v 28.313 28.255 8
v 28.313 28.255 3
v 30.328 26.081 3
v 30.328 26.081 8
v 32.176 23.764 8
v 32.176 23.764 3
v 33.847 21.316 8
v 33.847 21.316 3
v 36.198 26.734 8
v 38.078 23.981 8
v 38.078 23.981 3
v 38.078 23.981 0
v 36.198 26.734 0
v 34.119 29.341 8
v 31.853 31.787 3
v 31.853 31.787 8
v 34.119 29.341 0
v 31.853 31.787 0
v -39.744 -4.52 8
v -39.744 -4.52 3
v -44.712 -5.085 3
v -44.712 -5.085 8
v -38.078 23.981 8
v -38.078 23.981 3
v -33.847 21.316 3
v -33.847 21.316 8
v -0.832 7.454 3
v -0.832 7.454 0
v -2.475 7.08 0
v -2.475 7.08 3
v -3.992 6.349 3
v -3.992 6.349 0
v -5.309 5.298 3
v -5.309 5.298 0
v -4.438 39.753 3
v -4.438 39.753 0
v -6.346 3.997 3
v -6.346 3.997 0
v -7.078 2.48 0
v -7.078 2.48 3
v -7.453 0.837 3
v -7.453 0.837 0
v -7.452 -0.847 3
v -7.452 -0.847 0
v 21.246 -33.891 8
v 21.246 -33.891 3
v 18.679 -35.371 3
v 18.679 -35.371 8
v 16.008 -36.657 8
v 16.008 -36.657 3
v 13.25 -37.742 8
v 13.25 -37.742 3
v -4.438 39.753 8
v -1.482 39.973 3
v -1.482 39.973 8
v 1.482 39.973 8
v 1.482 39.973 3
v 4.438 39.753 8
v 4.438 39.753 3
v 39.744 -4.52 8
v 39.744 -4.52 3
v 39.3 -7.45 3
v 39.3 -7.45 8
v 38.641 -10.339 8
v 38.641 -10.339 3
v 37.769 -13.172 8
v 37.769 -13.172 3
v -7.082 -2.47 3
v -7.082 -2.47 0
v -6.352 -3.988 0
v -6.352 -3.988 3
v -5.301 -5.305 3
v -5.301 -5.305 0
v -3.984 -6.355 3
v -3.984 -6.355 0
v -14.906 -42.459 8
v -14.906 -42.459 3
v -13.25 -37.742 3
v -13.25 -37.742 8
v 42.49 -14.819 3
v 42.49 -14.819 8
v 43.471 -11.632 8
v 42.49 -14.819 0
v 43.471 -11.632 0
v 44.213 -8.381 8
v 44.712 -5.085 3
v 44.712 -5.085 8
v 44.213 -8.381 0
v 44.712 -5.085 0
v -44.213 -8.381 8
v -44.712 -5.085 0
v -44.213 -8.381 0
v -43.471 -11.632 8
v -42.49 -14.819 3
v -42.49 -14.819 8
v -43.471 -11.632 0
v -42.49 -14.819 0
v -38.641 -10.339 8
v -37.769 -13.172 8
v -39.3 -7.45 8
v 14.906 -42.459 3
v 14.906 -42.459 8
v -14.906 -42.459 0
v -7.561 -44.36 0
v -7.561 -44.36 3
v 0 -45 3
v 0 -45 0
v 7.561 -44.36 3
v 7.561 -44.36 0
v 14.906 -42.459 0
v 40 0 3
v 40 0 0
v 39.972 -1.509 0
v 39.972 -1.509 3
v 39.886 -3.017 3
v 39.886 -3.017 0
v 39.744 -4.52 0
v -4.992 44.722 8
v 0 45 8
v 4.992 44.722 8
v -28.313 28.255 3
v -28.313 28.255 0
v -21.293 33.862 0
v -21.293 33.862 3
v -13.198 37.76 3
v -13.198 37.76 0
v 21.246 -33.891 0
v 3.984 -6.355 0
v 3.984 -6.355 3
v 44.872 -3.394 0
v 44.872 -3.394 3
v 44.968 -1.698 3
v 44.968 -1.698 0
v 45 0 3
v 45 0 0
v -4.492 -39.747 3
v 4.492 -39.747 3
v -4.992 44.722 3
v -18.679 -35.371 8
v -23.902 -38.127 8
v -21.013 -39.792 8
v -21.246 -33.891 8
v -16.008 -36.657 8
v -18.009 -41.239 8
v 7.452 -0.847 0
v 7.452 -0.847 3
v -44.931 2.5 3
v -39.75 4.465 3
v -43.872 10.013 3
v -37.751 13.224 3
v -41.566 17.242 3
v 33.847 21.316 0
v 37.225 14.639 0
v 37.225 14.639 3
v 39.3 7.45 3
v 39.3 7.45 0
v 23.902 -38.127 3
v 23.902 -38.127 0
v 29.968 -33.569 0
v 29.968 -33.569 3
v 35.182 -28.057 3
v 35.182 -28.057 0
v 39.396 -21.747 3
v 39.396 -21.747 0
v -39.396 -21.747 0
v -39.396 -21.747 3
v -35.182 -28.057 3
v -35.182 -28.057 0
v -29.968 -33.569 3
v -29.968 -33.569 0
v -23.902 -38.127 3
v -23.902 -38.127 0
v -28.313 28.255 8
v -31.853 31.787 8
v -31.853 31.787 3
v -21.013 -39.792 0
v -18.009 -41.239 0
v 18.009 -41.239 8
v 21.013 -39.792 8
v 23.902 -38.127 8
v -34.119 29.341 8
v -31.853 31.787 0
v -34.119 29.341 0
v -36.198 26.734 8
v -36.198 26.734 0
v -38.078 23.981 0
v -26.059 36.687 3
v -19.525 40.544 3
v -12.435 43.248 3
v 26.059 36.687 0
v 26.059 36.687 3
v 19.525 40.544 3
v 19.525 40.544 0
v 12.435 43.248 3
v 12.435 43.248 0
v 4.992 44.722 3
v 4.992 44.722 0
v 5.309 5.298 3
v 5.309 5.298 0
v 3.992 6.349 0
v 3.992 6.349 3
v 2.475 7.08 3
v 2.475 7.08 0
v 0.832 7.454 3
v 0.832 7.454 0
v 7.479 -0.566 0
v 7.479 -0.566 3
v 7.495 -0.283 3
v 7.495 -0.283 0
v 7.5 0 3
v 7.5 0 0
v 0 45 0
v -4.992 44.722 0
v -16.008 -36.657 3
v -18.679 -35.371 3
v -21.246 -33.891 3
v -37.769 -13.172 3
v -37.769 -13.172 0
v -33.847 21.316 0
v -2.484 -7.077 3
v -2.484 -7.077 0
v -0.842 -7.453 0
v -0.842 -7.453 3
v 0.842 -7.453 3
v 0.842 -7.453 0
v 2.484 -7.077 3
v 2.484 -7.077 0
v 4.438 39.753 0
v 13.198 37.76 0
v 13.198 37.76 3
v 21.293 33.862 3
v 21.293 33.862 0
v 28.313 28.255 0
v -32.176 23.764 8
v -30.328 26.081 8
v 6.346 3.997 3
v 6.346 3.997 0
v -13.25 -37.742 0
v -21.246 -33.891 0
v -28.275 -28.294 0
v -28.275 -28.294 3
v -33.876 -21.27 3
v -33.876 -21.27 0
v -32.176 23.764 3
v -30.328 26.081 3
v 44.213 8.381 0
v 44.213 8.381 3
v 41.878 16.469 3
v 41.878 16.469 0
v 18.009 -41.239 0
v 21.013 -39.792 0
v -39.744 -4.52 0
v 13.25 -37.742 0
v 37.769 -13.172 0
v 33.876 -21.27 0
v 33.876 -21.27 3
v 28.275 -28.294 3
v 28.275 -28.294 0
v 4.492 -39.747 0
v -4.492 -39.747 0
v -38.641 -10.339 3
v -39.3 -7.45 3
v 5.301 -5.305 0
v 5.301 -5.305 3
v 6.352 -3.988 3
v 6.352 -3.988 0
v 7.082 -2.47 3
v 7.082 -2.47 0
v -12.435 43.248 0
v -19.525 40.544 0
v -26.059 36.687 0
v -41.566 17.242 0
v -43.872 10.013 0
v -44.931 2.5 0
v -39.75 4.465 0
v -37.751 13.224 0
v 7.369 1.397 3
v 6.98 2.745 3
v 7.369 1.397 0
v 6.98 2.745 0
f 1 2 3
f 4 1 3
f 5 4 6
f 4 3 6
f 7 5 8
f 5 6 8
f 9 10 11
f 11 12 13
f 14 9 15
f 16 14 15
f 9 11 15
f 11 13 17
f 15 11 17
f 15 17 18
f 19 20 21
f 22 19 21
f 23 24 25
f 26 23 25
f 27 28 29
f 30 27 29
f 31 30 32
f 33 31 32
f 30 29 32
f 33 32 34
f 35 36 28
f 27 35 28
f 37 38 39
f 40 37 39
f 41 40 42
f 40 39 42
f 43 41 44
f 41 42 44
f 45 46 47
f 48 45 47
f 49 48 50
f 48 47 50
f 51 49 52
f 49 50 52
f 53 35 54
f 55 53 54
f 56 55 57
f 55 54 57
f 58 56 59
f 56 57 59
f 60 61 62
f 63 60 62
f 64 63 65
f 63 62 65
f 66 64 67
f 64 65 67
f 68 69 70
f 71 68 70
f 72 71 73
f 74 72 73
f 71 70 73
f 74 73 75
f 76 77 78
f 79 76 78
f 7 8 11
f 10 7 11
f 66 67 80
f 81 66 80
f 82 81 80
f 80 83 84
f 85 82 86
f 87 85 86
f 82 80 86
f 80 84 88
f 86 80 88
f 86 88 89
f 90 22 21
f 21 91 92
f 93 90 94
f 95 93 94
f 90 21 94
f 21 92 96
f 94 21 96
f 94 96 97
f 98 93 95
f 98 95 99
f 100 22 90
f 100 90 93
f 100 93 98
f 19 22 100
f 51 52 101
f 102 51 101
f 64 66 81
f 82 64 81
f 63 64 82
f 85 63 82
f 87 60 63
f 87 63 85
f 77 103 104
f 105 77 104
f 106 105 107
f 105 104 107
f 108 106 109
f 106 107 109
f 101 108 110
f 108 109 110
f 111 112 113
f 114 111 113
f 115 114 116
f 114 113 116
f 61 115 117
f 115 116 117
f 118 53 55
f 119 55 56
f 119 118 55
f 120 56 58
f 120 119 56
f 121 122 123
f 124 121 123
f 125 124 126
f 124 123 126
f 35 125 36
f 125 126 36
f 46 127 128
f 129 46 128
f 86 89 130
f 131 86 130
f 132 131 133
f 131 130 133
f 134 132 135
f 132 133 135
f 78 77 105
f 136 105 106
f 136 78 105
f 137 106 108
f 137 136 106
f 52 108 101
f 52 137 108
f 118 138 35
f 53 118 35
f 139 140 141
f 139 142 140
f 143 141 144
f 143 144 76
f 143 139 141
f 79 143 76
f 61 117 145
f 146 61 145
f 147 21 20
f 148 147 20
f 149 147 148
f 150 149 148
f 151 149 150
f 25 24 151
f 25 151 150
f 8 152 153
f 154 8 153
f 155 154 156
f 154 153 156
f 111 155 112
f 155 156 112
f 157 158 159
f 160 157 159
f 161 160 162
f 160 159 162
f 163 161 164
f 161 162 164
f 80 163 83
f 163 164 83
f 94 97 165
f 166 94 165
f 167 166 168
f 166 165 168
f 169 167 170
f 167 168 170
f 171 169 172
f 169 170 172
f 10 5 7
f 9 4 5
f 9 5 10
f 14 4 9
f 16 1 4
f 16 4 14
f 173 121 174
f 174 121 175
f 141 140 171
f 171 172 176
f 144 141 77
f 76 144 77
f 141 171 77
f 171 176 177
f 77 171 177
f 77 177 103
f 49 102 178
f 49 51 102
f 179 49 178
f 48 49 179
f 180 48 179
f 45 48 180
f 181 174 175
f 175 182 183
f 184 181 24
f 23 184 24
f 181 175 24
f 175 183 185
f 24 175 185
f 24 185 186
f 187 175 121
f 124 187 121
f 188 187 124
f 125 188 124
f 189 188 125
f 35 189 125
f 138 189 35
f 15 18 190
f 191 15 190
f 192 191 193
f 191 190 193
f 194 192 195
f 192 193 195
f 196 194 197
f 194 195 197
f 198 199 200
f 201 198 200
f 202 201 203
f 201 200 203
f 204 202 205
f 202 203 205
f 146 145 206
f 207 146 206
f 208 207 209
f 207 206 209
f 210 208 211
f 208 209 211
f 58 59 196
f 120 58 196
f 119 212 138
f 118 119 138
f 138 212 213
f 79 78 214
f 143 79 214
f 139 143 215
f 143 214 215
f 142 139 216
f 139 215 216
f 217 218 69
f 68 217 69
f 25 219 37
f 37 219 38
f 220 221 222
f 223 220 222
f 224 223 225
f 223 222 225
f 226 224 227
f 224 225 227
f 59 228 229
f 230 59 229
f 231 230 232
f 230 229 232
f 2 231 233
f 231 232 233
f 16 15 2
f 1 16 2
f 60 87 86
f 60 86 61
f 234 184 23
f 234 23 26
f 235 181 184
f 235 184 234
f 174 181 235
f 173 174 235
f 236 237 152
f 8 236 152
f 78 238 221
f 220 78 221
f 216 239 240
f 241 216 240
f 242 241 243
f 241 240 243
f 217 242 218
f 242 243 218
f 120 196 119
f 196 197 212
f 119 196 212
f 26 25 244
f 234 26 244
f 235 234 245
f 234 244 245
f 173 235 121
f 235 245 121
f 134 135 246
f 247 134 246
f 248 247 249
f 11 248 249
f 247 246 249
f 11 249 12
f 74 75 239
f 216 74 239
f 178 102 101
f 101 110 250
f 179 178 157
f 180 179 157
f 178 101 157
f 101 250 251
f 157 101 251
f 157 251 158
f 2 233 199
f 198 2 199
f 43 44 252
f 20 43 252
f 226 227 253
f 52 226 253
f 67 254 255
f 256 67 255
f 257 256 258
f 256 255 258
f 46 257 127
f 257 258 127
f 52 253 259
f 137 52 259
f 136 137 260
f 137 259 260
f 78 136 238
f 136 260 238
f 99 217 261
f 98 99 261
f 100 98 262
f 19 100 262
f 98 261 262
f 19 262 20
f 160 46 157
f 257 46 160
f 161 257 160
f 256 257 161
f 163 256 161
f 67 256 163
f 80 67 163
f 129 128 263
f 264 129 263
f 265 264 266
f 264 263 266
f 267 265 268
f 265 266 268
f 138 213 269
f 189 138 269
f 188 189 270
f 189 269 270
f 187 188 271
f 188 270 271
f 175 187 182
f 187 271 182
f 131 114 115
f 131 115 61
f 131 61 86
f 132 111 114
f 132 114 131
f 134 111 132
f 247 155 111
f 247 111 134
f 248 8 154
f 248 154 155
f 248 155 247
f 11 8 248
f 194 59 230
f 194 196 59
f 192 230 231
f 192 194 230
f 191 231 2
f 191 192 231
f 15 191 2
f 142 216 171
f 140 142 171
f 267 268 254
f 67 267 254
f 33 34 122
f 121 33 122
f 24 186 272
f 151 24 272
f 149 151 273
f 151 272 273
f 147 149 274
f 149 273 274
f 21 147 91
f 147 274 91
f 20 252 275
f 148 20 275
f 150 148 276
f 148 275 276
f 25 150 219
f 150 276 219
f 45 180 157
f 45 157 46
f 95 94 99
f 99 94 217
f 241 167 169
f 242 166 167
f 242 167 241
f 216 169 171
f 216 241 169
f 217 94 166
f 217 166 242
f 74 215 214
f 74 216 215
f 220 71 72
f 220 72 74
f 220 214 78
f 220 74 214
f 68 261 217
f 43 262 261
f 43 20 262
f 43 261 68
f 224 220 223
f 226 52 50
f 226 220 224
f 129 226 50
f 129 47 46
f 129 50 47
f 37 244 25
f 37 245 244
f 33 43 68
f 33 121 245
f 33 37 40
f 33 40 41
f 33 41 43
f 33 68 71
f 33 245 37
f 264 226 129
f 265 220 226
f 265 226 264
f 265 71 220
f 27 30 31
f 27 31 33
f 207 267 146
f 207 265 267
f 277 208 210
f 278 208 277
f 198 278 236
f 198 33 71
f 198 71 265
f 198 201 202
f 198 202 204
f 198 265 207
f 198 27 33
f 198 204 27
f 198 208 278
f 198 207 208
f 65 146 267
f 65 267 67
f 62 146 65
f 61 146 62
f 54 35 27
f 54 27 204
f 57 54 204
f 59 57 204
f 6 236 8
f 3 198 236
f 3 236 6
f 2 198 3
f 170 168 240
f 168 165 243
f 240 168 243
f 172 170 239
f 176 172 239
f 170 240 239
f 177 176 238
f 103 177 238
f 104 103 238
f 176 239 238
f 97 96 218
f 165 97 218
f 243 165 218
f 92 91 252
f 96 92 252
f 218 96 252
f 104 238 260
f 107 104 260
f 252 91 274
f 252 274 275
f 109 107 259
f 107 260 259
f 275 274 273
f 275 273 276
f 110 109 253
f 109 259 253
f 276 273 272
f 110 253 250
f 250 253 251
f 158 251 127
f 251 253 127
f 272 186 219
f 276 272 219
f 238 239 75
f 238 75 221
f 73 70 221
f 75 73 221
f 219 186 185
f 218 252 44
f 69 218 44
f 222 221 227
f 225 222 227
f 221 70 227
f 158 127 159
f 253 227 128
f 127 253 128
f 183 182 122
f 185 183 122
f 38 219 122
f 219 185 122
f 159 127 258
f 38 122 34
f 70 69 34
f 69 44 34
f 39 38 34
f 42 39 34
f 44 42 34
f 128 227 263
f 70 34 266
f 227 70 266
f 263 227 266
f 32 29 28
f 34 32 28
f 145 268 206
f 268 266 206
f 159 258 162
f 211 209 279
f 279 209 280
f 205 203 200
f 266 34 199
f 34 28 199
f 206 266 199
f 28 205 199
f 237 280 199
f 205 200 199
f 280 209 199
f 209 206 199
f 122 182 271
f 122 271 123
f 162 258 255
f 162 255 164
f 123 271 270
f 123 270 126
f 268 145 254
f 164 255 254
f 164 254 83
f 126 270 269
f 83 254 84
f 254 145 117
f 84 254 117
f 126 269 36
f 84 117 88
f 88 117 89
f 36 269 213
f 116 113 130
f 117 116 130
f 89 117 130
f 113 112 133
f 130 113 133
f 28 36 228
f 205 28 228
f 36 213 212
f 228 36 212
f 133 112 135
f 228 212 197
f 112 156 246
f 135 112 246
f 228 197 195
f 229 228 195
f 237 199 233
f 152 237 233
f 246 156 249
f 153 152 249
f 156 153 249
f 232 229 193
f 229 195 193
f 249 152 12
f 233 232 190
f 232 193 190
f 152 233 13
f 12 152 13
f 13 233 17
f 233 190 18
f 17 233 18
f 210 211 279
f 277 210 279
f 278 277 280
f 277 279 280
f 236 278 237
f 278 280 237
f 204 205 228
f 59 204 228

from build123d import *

# Parameters (mm, degrees)
F1_DEPTH = 3
F2_DEPTH = 8


with BuildPart() as f1:
    # F0 (on Top) → F1 (new body)
    with BuildSketch(Plane.XY):
        with BuildLine():
            Line((-4.4375804335, 39.7530864198), (-4.9922779877, 44.7222222222))
            ThreePointArc((-4.9922779877, 44.7222222222), (-19.5247682603, 40.5435990556), (-31.8526068859, 31.786969572))
            Line((-31.8526068859, 31.786969572), (-28.313428343, 28.255084064))
            ThreePointArc((-28.313428343, 28.255084064), (-17.3553495647, 36.0387547161), (-4.4375804335, 39.7530864198))
        make_face()
        with BuildLine():
            Line((-28.313428343, 28.255084064), (-31.8526068859, 31.786969572))
            ThreePointArc((-31.8526068859, 31.786969572), (-35.1824167111, 28.0570410836), (-38.0778757126, 23.980729372))
            Line((-38.0778757126, 23.980729372), (-33.8470006334, 21.3162038862))
            ThreePointArc((-33.8470006334, 21.3162038862), (-31.2732592987, 24.9395920743), (-28.313428343, 28.255084064))
        make_face()
        with BuildLine():
            ThreePointArc((-6.3463126188, 3.9967882287), (-5.8637361185, 4.6761735139), (-5.3087678143, 5.297828262))
            Line((-5.3087678143, 5.297828262), (-28.313428343, 28.255084064))
            ThreePointArc((-28.313428343, 28.255084064), (-31.2732592987, 24.9395920743), (-33.8470006334, 21.3162038862))
            Line((-33.8470006334, 21.3162038862), (-6.3463126188, 3.9967882287))
        make_face()
        with BuildLine():
            ThreePointArc((-7.0816760631, -2.4697903022), (-7.3119593414, -1.6689070047), (-7.4519715166, -0.847419917))
            Line((-7.4519715166, -0.847419917), (-39.7438480886, -4.5195728906))
            ThreePointArc((-39.7438480886, -4.5195728906), (-38.9971164873, -8.9008373583), (-37.7689390034, -13.1722149449))
            Line((-37.7689390034, -13.1722149449), (-7.0816760631, -2.4697903022))
        make_face()
        with BuildLine():
            ThreePointArc((-37.7689390034, -13.1722149449), (-38.9971164873, -8.9008373583), (-39.7438480886, -4.5195728906))
            Line((-39.7438480886, -4.5195728906), (-44.7118290996, -5.0845195019))
            ThreePointArc((-44.7118290996, -5.0845195019), (-43.8717560482, -10.013442028), (-42.4900563789, -14.818741813))
            Line((-42.4900563789, -14.818741813), (-37.7689390034, -13.1722149449))
        make_face()
        with BuildLine():
            ThreePointArc((-39.7438480886, -4.5195728906), (-38.9971164873, 8.9008373583), (-33.8470006334, 21.3162038862))
            Line((-33.8470006334, 21.3162038862), (-38.0778757126, 23.980729372))
            ThreePointArc((-38.0778757126, 23.980729372), (-43.8717560482, 10.013442028), (-44.7118290996, -5.0845195019))
            Line((-44.7118290996, -5.0845195019), (-39.7438480886, -4.5195728906))
        make_face()
        with BuildLine():
            ThreePointArc((-21.2463395966, -33.8908992761), (-31.2732592987, -24.9395920743), (-37.7689390034, -13.1722149449))
            Line((-37.7689390034, -13.1722149449), (-42.4900563789, -14.818741813))
            ThreePointArc((-42.4900563789, -14.818741813), (-35.1824167111, -28.0570410836), (-23.9021320462, -38.1272616856))
            Line((-23.9021320462, -38.1272616856), (-21.2463395966, -33.8908992761))
        make_face()
        with BuildLine():
            ThreePointArc((-2.4843929921, -7.0765663609), (-3.2541280434, -6.7572665093), (-3.9836886744, -6.3545436143))
            Line((-3.9836886744, -6.3545436143), (-21.2463395966, -33.8908992761))
            ThreePointArc((-21.2463395966, -33.8908992761), (-17.3553495647, -36.0387547161), (-13.2500959579, -37.7416872583))
            Line((-13.2500959579, -37.7416872583), (-2.4843929921, -7.0765663609))
        make_face()
        with BuildLine():
            ThreePointArc((-23.9021320462, -38.1272616856), (-19.5247682603, -40.5435990556), (-14.9063579526, -42.4593981656))
            Line((-14.9063579526, -42.4593981656), (-13.2500959579, -37.7416872583))
            ThreePointArc((-13.2500959579, -37.7416872583), (-17.3553495647, -36.0387547161), (-21.2463395966, -33.8908992761))
            Line((-21.2463395966, -33.8908992761), (-23.9021320462, -38.1272616856))
        make_face()
        with BuildLine():
            ThreePointArc((-14.9063579526, -42.4593981656), (0, -45), (14.9063579526, -42.4593981656))
            Line((14.9063579526, -42.4593981656), (13.2500959579, -37.7416872583))
            ThreePointArc((13.2500959579, -37.7416872583), (0, -40), (-13.2500959579, -37.7416872583))
            Line((-13.2500959579, -37.7416872583), (-14.9063579526, -42.4593981656))
        make_face()
        with BuildLine():
            ThreePointArc((14.9063579526, -42.4593981656), (19.5247682603, -40.5435990556), (23.9021320462, -38.1272616856))
            Line((23.9021320462, -38.1272616856), (21.2463395966, -33.8908992761))
            ThreePointArc((21.2463395966, -33.8908992761), (17.3553495647, -36.0387547161), (13.2500959579, -37.7416872583))
            Line((13.2500959579, -37.7416872583), (14.9063579526, -42.4593981656))
        make_face()
        with BuildLine():
            ThreePointArc((13.2500959579, -37.7416872583), (17.3553495647, -36.0387547161), (21.2463395966, -33.8908992761))
            Line((21.2463395966, -33.8908992761), (3.9836886744, -6.3545436143))
            ThreePointArc((3.9836886744, -6.3545436143), (3.2541280434, -6.7572665093), (2.4843929921, -7.0765663609))
            Line((2.4843929921, -7.0765663609), (13.2500959579, -37.7416872583))
        make_face()
        with BuildLine():
            ThreePointArc((23.9021320462, -38.1272616856), (35.1824167111, -28.0570410836), (42.4900563789, -14.818741813))
            Line((42.4900563789, -14.818741813), (37.7689390034, -13.1722149449))
            ThreePointArc((37.7689390034, -13.1722149449), (31.2732592987, -24.9395920743), (21.2463395966, -33.8908992761))
            Line((21.2463395966, -33.8908992761), (23.9021320462, -38.1272616856))
        make_face()
        with BuildLine():
            ThreePointArc((42.4900563789, -14.818741813), (43.8717560482, -10.013442028), (44.7118290996, -5.0845195019))
            Line((44.7118290996, -5.0845195019), (39.7438480886, -4.5195728906))
            ThreePointArc((39.7438480886, -4.5195728906), (38.9971164873, -8.9008373583), (37.7689390034, -13.1722149449))
            Line((37.7689390034, -13.1722149449), (42.4900563789, -14.818741813))
        make_face()
        with BuildLine():
            ThreePointArc((37.7689390034, -13.1722149449), (38.9971164873, -8.9008373583), (39.7438480886, -4.5195728906))
            Line((39.7438480886, -4.5195728906), (7.4519715166, -0.847419917))
            ThreePointArc((7.4519715166, -0.847419917), (7.3119593414, -1.6689070047), (7.0816760631, -2.4697903022))
            Line((7.0816760631, -2.4697903022), (37.7689390034, -13.1722149449))
        make_face()
        with BuildLine():
            Line((-5.3087678143, 5.297828262), (0, 0))
            Line((0, 0), (-0.8320463313, 7.4537037037))
            ThreePointArc((-0.8320463313, 7.4537037037), (-3.2541280434, 6.7572665093), (-5.3087678143, 5.297828262))
        make_face()
        with BuildLine():
            Line((-6.3463126188, 3.9967882287), (0, 0))
            Line((0, 0), (-5.3087678143, 5.297828262))
            ThreePointArc((-5.3087678143, 5.297828262), (-5.8637361185, 4.6761735139), (-6.3463126188, 3.9967882287))
        make_face()
        with BuildLine():
            Line((-7.4519715166, -0.847419917), (0, 0))
            Line((0, 0), (-6.3463126188, 3.9967882287))
            ThreePointArc((-6.3463126188, 3.9967882287), (-7.3119593414, 1.6689070047), (-7.4519715166, -0.847419917))
        make_face()
        with BuildLine():
            Line((-7.0816760631, -2.4697903022), (0, 0))
            Line((0, 0), (-7.4519715166, -0.847419917))
            ThreePointArc((-7.4519715166, -0.847419917), (-7.3119593414, -1.6689070047), (-7.0816760631, -2.4697903022))
        make_face()
        with BuildLine():
            Line((-3.9836886744, -6.3545436143), (0, 0))
            Line((0, 0), (-7.0816760631, -2.4697903022))
            ThreePointArc((-7.0816760631, -2.4697903022), (-5.8637361185, -4.6761735139), (-3.9836886744, -6.3545436143))
        make_face()
        with BuildLine():
            Line((-2.4843929921, -7.0765663609), (0, 0))
            Line((0, 0), (-3.9836886744, -6.3545436143))
            ThreePointArc((-3.9836886744, -6.3545436143), (-3.2541280434, -6.7572665093), (-2.4843929921, -7.0765663609))
        make_face()
        with BuildLine():
            Line((2.4843929921, -7.0765663609), (0, 0))
            Line((0, 0), (-2.4843929921, -7.0765663609))
            ThreePointArc((-2.4843929921, -7.0765663609), (0, -7.5), (2.4843929921, -7.0765663609))
        make_face()
        with BuildLine():
            Line((3.9836886744, -6.3545436143), (0, 0))
            Line((0, 0), (2.4843929921, -7.0765663609))
            ThreePointArc((2.4843929921, -7.0765663609), (3.2541280434, -6.7572665093), (3.9836886744, -6.3545436143))
        make_face()
        with BuildLine():
            Line((7.0816760631, -2.4697903022), (0, 0))
            Line((0, 0), (3.9836886744, -6.3545436143))
            ThreePointArc((3.9836886744, -6.3545436143), (5.8637361185, -4.6761735139), (7.0816760631, -2.4697903022))
        make_face()
        with BuildLine():
            ThreePointArc((7.0816760631, -2.4697903022), (7.3119593414, -1.6689070047), (7.4519715166, -0.847419917))
            Line((7.4519715166, -0.847419917), (0, 0))
            Line((0, 0), (7.0816760631, -2.4697903022))
        make_face()
        with BuildLine():
            ThreePointArc((7.5, 0), (7.2058082351, 2.0799826152), (6.3463126188, 3.9967882287))
            Line((6.3463126188, 3.9967882287), (0, 0))
            Line((0, 0), (7.4519715166, -0.847419917))
            ThreePointArc((7.4519715166, -0.847419917), (7.4879832523, -0.4243899301), (7.5, 0))
        make_face()
        with BuildLine():
            Line((0, 0), (6.3463126188, 3.9967882287))
            ThreePointArc((6.3463126188, 3.9967882287), (5.8637361185, 4.6761735139), (5.3087678143, 5.297828262))
            Line((5.3087678143, 5.297828262), (0, 0))
        make_face()
        with BuildLine():
            Line((0, 0), (5.3087678143, 5.297828262))
            ThreePointArc((5.3087678143, 5.297828262), (3.2541280434, 6.7572665093), (0.8320463313, 7.4537037037))
            Line((0.8320463313, 7.4537037037), (0, 0))
        make_face()
        with BuildLine():
            Line((-0.8320463313, 7.4537037037), (0, 0))
            Line((0, 0), (0.8320463313, 7.4537037037))
            ThreePointArc((0.8320463313, 7.4537037037), (0, 7.5), (-0.8320463313, 7.4537037037))
        make_face()
        with BuildLine():
            Line((6.3463126188, 3.9967882287), (33.8470006334, 21.3162038862))
            ThreePointArc((33.8470006334, 21.3162038862), (31.2732592987, 24.9395920743), (28.313428343, 28.255084064))
            Line((28.313428343, 28.255084064), (5.3087678143, 5.297828262))
            ThreePointArc((5.3087678143, 5.297828262), (5.8637361185, 4.6761735139), (6.3463126188, 3.9967882287))
        make_face()
        with BuildLine():
            Line((0.8320463313, 7.4537037037), (4.4375804335, 39.7530864198))
            ThreePointArc((4.4375804335, 39.7530864198), (0, 40), (-4.4375804335, 39.7530864198))
            Line((-4.4375804335, 39.7530864198), (-0.8320463313, 7.4537037037))
            ThreePointArc((-0.8320463313, 7.4537037037), (0, 7.5), (0.8320463313, 7.4537037037))
        make_face()
        with BuildLine():
            Line((4.4375804335, 39.7530864198), (4.9922779877, 44.7222222222))
            Line((4.9922779877, 44.7222222222), (0, 45))
            Line((0, 45), (-4.9922779877, 44.7222222222))
            Line((-4.9922779877, 44.7222222222), (-4.4375804335, 39.7530864198))
            ThreePointArc((-4.4375804335, 39.7530864198), (0, 40), (4.4375804335, 39.7530864198))
        make_face()
        with BuildLine():
            Line((28.313428343, 28.255084064), (31.8526068859, 31.786969572))
            ThreePointArc((31.8526068859, 31.786969572), (19.5247682603, 40.5435990556), (4.9922779877, 44.7222222222))
            Line((4.9922779877, 44.7222222222), (4.4375804335, 39.7530864198))
            ThreePointArc((4.4375804335, 39.7530864198), (17.3553495647, 36.0387547161), (28.313428343, 28.255084064))
        make_face()
        with BuildLine():
            Line((33.8470006334, 21.3162038862), (38.0778757126, 23.980729372))
            ThreePointArc((38.0778757126, 23.980729372), (35.1824167111, 28.0570410836), (31.8526068859, 31.786969572))
            Line((31.8526068859, 31.786969572), (28.313428343, 28.255084064))
            ThreePointArc((28.313428343, 28.255084064), (31.2732592987, 24.9395920743), (33.8470006334, 21.3162038862))
        make_face()
        with BuildLine():
            ThreePointArc((44.7118290996, -5.0845195019), (44.927899514, -2.5463395803), (45, 0))
            ThreePointArc((45, 0), (43.2348494103, 12.4798956913), (38.0778757126, 23.980729372))
            Line((38.0778757126, 23.980729372), (33.8470006334, 21.3162038862))
            ThreePointArc((33.8470006334, 21.3162038862), (38.4309772536, 11.0932406145), (40, 0))
            ThreePointArc((40, 0), (39.9359106791, -2.2634129603), (39.7438480886, -4.5195728906))
            Line((39.7438480886, -4.5195728906), (44.7118290996, -5.0845195019))
        make_face()
    extrude(amount=F1_DEPTH)

    # F0 (on Top) → F2 (join)
    with BuildSketch(Plane.XY):
        with BuildLine():
            Line((4.4375804335, 39.7530864198), (4.9922779877, 44.7222222222))
            Line((4.9922779877, 44.7222222222), (0, 45))
            Line((0, 45), (-4.9922779877, 44.7222222222))
            Line((-4.9922779877, 44.7222222222), (-4.4375804335, 39.7530864198))
            ThreePointArc((-4.4375804335, 39.7530864198), (0, 40), (4.4375804335, 39.7530864198))
        make_face()
        with BuildLine():
            Line((-28.313428343, 28.255084064), (-31.8526068859, 31.786969572))
            ThreePointArc((-31.8526068859, 31.786969572), (-35.1824167111, 28.0570410836), (-38.0778757126, 23.980729372))
            Line((-38.0778757126, 23.980729372), (-33.8470006334, 21.3162038862))
            ThreePointArc((-33.8470006334, 21.3162038862), (-31.2732592987, 24.9395920743), (-28.313428343, 28.255084064))
        make_face()
        with BuildLine():
            ThreePointArc((-37.7689390034, -13.1722149449), (-38.9971164873, -8.9008373583), (-39.7438480886, -4.5195728906))
            Line((-39.7438480886, -4.5195728906), (-44.7118290996, -5.0845195019))
            ThreePointArc((-44.7118290996, -5.0845195019), (-43.8717560482, -10.013442028), (-42.4900563789, -14.818741813))
            Line((-42.4900563789, -14.818741813), (-37.7689390034, -13.1722149449))
        make_face()
        with BuildLine():
            ThreePointArc((-23.9021320462, -38.1272616856), (-19.5247682603, -40.5435990556), (-14.9063579526, -42.4593981656))
            Line((-14.9063579526, -42.4593981656), (-13.2500959579, -37.7416872583))
            ThreePointArc((-13.2500959579, -37.7416872583), (-17.3553495647, -36.0387547161), (-21.2463395966, -33.8908992761))
            Line((-21.2463395966, -33.8908992761), (-23.9021320462, -38.1272616856))
        make_face()
        with BuildLine():
            ThreePointArc((14.9063579526, -42.4593981656), (19.5247682603, -40.5435990556), (23.9021320462, -38.1272616856))
            Line((23.9021320462, -38.1272616856), (21.2463395966, -33.8908992761))
            ThreePointArc((21.2463395966, -33.8908992761), (17.3553495647, -36.0387547161), (13.2500959579, -37.7416872583))
            Line((13.2500959579, -37.7416872583), (14.9063579526, -42.4593981656))
        make_face()
        with BuildLine():
            ThreePointArc((42.4900563789, -14.818741813), (43.8717560482, -10.013442028), (44.7118290996, -5.0845195019))
            Line((44.7118290996, -5.0845195019), (39.7438480886, -4.5195728906))
            ThreePointArc((39.7438480886, -4.5195728906), (38.9971164873, -8.9008373583), (37.7689390034, -13.1722149449))
            Line((37.7689390034, -13.1722149449), (42.4900563789, -14.818741813))
        make_face()
        with BuildLine():
            Line((33.8470006334, 21.3162038862), (38.0778757126, 23.980729372))
            ThreePointArc((38.0778757126, 23.980729372), (35.1824167111, 28.0570410836), (31.8526068859, 31.786969572))
            Line((31.8526068859, 31.786969572), (28.313428343, 28.255084064))
            ThreePointArc((28.313428343, 28.255084064), (31.2732592987, 24.9395920743), (33.8470006334, 21.3162038862))
        make_face()
    extrude(amount=F2_DEPTH)


solid = f1.part
